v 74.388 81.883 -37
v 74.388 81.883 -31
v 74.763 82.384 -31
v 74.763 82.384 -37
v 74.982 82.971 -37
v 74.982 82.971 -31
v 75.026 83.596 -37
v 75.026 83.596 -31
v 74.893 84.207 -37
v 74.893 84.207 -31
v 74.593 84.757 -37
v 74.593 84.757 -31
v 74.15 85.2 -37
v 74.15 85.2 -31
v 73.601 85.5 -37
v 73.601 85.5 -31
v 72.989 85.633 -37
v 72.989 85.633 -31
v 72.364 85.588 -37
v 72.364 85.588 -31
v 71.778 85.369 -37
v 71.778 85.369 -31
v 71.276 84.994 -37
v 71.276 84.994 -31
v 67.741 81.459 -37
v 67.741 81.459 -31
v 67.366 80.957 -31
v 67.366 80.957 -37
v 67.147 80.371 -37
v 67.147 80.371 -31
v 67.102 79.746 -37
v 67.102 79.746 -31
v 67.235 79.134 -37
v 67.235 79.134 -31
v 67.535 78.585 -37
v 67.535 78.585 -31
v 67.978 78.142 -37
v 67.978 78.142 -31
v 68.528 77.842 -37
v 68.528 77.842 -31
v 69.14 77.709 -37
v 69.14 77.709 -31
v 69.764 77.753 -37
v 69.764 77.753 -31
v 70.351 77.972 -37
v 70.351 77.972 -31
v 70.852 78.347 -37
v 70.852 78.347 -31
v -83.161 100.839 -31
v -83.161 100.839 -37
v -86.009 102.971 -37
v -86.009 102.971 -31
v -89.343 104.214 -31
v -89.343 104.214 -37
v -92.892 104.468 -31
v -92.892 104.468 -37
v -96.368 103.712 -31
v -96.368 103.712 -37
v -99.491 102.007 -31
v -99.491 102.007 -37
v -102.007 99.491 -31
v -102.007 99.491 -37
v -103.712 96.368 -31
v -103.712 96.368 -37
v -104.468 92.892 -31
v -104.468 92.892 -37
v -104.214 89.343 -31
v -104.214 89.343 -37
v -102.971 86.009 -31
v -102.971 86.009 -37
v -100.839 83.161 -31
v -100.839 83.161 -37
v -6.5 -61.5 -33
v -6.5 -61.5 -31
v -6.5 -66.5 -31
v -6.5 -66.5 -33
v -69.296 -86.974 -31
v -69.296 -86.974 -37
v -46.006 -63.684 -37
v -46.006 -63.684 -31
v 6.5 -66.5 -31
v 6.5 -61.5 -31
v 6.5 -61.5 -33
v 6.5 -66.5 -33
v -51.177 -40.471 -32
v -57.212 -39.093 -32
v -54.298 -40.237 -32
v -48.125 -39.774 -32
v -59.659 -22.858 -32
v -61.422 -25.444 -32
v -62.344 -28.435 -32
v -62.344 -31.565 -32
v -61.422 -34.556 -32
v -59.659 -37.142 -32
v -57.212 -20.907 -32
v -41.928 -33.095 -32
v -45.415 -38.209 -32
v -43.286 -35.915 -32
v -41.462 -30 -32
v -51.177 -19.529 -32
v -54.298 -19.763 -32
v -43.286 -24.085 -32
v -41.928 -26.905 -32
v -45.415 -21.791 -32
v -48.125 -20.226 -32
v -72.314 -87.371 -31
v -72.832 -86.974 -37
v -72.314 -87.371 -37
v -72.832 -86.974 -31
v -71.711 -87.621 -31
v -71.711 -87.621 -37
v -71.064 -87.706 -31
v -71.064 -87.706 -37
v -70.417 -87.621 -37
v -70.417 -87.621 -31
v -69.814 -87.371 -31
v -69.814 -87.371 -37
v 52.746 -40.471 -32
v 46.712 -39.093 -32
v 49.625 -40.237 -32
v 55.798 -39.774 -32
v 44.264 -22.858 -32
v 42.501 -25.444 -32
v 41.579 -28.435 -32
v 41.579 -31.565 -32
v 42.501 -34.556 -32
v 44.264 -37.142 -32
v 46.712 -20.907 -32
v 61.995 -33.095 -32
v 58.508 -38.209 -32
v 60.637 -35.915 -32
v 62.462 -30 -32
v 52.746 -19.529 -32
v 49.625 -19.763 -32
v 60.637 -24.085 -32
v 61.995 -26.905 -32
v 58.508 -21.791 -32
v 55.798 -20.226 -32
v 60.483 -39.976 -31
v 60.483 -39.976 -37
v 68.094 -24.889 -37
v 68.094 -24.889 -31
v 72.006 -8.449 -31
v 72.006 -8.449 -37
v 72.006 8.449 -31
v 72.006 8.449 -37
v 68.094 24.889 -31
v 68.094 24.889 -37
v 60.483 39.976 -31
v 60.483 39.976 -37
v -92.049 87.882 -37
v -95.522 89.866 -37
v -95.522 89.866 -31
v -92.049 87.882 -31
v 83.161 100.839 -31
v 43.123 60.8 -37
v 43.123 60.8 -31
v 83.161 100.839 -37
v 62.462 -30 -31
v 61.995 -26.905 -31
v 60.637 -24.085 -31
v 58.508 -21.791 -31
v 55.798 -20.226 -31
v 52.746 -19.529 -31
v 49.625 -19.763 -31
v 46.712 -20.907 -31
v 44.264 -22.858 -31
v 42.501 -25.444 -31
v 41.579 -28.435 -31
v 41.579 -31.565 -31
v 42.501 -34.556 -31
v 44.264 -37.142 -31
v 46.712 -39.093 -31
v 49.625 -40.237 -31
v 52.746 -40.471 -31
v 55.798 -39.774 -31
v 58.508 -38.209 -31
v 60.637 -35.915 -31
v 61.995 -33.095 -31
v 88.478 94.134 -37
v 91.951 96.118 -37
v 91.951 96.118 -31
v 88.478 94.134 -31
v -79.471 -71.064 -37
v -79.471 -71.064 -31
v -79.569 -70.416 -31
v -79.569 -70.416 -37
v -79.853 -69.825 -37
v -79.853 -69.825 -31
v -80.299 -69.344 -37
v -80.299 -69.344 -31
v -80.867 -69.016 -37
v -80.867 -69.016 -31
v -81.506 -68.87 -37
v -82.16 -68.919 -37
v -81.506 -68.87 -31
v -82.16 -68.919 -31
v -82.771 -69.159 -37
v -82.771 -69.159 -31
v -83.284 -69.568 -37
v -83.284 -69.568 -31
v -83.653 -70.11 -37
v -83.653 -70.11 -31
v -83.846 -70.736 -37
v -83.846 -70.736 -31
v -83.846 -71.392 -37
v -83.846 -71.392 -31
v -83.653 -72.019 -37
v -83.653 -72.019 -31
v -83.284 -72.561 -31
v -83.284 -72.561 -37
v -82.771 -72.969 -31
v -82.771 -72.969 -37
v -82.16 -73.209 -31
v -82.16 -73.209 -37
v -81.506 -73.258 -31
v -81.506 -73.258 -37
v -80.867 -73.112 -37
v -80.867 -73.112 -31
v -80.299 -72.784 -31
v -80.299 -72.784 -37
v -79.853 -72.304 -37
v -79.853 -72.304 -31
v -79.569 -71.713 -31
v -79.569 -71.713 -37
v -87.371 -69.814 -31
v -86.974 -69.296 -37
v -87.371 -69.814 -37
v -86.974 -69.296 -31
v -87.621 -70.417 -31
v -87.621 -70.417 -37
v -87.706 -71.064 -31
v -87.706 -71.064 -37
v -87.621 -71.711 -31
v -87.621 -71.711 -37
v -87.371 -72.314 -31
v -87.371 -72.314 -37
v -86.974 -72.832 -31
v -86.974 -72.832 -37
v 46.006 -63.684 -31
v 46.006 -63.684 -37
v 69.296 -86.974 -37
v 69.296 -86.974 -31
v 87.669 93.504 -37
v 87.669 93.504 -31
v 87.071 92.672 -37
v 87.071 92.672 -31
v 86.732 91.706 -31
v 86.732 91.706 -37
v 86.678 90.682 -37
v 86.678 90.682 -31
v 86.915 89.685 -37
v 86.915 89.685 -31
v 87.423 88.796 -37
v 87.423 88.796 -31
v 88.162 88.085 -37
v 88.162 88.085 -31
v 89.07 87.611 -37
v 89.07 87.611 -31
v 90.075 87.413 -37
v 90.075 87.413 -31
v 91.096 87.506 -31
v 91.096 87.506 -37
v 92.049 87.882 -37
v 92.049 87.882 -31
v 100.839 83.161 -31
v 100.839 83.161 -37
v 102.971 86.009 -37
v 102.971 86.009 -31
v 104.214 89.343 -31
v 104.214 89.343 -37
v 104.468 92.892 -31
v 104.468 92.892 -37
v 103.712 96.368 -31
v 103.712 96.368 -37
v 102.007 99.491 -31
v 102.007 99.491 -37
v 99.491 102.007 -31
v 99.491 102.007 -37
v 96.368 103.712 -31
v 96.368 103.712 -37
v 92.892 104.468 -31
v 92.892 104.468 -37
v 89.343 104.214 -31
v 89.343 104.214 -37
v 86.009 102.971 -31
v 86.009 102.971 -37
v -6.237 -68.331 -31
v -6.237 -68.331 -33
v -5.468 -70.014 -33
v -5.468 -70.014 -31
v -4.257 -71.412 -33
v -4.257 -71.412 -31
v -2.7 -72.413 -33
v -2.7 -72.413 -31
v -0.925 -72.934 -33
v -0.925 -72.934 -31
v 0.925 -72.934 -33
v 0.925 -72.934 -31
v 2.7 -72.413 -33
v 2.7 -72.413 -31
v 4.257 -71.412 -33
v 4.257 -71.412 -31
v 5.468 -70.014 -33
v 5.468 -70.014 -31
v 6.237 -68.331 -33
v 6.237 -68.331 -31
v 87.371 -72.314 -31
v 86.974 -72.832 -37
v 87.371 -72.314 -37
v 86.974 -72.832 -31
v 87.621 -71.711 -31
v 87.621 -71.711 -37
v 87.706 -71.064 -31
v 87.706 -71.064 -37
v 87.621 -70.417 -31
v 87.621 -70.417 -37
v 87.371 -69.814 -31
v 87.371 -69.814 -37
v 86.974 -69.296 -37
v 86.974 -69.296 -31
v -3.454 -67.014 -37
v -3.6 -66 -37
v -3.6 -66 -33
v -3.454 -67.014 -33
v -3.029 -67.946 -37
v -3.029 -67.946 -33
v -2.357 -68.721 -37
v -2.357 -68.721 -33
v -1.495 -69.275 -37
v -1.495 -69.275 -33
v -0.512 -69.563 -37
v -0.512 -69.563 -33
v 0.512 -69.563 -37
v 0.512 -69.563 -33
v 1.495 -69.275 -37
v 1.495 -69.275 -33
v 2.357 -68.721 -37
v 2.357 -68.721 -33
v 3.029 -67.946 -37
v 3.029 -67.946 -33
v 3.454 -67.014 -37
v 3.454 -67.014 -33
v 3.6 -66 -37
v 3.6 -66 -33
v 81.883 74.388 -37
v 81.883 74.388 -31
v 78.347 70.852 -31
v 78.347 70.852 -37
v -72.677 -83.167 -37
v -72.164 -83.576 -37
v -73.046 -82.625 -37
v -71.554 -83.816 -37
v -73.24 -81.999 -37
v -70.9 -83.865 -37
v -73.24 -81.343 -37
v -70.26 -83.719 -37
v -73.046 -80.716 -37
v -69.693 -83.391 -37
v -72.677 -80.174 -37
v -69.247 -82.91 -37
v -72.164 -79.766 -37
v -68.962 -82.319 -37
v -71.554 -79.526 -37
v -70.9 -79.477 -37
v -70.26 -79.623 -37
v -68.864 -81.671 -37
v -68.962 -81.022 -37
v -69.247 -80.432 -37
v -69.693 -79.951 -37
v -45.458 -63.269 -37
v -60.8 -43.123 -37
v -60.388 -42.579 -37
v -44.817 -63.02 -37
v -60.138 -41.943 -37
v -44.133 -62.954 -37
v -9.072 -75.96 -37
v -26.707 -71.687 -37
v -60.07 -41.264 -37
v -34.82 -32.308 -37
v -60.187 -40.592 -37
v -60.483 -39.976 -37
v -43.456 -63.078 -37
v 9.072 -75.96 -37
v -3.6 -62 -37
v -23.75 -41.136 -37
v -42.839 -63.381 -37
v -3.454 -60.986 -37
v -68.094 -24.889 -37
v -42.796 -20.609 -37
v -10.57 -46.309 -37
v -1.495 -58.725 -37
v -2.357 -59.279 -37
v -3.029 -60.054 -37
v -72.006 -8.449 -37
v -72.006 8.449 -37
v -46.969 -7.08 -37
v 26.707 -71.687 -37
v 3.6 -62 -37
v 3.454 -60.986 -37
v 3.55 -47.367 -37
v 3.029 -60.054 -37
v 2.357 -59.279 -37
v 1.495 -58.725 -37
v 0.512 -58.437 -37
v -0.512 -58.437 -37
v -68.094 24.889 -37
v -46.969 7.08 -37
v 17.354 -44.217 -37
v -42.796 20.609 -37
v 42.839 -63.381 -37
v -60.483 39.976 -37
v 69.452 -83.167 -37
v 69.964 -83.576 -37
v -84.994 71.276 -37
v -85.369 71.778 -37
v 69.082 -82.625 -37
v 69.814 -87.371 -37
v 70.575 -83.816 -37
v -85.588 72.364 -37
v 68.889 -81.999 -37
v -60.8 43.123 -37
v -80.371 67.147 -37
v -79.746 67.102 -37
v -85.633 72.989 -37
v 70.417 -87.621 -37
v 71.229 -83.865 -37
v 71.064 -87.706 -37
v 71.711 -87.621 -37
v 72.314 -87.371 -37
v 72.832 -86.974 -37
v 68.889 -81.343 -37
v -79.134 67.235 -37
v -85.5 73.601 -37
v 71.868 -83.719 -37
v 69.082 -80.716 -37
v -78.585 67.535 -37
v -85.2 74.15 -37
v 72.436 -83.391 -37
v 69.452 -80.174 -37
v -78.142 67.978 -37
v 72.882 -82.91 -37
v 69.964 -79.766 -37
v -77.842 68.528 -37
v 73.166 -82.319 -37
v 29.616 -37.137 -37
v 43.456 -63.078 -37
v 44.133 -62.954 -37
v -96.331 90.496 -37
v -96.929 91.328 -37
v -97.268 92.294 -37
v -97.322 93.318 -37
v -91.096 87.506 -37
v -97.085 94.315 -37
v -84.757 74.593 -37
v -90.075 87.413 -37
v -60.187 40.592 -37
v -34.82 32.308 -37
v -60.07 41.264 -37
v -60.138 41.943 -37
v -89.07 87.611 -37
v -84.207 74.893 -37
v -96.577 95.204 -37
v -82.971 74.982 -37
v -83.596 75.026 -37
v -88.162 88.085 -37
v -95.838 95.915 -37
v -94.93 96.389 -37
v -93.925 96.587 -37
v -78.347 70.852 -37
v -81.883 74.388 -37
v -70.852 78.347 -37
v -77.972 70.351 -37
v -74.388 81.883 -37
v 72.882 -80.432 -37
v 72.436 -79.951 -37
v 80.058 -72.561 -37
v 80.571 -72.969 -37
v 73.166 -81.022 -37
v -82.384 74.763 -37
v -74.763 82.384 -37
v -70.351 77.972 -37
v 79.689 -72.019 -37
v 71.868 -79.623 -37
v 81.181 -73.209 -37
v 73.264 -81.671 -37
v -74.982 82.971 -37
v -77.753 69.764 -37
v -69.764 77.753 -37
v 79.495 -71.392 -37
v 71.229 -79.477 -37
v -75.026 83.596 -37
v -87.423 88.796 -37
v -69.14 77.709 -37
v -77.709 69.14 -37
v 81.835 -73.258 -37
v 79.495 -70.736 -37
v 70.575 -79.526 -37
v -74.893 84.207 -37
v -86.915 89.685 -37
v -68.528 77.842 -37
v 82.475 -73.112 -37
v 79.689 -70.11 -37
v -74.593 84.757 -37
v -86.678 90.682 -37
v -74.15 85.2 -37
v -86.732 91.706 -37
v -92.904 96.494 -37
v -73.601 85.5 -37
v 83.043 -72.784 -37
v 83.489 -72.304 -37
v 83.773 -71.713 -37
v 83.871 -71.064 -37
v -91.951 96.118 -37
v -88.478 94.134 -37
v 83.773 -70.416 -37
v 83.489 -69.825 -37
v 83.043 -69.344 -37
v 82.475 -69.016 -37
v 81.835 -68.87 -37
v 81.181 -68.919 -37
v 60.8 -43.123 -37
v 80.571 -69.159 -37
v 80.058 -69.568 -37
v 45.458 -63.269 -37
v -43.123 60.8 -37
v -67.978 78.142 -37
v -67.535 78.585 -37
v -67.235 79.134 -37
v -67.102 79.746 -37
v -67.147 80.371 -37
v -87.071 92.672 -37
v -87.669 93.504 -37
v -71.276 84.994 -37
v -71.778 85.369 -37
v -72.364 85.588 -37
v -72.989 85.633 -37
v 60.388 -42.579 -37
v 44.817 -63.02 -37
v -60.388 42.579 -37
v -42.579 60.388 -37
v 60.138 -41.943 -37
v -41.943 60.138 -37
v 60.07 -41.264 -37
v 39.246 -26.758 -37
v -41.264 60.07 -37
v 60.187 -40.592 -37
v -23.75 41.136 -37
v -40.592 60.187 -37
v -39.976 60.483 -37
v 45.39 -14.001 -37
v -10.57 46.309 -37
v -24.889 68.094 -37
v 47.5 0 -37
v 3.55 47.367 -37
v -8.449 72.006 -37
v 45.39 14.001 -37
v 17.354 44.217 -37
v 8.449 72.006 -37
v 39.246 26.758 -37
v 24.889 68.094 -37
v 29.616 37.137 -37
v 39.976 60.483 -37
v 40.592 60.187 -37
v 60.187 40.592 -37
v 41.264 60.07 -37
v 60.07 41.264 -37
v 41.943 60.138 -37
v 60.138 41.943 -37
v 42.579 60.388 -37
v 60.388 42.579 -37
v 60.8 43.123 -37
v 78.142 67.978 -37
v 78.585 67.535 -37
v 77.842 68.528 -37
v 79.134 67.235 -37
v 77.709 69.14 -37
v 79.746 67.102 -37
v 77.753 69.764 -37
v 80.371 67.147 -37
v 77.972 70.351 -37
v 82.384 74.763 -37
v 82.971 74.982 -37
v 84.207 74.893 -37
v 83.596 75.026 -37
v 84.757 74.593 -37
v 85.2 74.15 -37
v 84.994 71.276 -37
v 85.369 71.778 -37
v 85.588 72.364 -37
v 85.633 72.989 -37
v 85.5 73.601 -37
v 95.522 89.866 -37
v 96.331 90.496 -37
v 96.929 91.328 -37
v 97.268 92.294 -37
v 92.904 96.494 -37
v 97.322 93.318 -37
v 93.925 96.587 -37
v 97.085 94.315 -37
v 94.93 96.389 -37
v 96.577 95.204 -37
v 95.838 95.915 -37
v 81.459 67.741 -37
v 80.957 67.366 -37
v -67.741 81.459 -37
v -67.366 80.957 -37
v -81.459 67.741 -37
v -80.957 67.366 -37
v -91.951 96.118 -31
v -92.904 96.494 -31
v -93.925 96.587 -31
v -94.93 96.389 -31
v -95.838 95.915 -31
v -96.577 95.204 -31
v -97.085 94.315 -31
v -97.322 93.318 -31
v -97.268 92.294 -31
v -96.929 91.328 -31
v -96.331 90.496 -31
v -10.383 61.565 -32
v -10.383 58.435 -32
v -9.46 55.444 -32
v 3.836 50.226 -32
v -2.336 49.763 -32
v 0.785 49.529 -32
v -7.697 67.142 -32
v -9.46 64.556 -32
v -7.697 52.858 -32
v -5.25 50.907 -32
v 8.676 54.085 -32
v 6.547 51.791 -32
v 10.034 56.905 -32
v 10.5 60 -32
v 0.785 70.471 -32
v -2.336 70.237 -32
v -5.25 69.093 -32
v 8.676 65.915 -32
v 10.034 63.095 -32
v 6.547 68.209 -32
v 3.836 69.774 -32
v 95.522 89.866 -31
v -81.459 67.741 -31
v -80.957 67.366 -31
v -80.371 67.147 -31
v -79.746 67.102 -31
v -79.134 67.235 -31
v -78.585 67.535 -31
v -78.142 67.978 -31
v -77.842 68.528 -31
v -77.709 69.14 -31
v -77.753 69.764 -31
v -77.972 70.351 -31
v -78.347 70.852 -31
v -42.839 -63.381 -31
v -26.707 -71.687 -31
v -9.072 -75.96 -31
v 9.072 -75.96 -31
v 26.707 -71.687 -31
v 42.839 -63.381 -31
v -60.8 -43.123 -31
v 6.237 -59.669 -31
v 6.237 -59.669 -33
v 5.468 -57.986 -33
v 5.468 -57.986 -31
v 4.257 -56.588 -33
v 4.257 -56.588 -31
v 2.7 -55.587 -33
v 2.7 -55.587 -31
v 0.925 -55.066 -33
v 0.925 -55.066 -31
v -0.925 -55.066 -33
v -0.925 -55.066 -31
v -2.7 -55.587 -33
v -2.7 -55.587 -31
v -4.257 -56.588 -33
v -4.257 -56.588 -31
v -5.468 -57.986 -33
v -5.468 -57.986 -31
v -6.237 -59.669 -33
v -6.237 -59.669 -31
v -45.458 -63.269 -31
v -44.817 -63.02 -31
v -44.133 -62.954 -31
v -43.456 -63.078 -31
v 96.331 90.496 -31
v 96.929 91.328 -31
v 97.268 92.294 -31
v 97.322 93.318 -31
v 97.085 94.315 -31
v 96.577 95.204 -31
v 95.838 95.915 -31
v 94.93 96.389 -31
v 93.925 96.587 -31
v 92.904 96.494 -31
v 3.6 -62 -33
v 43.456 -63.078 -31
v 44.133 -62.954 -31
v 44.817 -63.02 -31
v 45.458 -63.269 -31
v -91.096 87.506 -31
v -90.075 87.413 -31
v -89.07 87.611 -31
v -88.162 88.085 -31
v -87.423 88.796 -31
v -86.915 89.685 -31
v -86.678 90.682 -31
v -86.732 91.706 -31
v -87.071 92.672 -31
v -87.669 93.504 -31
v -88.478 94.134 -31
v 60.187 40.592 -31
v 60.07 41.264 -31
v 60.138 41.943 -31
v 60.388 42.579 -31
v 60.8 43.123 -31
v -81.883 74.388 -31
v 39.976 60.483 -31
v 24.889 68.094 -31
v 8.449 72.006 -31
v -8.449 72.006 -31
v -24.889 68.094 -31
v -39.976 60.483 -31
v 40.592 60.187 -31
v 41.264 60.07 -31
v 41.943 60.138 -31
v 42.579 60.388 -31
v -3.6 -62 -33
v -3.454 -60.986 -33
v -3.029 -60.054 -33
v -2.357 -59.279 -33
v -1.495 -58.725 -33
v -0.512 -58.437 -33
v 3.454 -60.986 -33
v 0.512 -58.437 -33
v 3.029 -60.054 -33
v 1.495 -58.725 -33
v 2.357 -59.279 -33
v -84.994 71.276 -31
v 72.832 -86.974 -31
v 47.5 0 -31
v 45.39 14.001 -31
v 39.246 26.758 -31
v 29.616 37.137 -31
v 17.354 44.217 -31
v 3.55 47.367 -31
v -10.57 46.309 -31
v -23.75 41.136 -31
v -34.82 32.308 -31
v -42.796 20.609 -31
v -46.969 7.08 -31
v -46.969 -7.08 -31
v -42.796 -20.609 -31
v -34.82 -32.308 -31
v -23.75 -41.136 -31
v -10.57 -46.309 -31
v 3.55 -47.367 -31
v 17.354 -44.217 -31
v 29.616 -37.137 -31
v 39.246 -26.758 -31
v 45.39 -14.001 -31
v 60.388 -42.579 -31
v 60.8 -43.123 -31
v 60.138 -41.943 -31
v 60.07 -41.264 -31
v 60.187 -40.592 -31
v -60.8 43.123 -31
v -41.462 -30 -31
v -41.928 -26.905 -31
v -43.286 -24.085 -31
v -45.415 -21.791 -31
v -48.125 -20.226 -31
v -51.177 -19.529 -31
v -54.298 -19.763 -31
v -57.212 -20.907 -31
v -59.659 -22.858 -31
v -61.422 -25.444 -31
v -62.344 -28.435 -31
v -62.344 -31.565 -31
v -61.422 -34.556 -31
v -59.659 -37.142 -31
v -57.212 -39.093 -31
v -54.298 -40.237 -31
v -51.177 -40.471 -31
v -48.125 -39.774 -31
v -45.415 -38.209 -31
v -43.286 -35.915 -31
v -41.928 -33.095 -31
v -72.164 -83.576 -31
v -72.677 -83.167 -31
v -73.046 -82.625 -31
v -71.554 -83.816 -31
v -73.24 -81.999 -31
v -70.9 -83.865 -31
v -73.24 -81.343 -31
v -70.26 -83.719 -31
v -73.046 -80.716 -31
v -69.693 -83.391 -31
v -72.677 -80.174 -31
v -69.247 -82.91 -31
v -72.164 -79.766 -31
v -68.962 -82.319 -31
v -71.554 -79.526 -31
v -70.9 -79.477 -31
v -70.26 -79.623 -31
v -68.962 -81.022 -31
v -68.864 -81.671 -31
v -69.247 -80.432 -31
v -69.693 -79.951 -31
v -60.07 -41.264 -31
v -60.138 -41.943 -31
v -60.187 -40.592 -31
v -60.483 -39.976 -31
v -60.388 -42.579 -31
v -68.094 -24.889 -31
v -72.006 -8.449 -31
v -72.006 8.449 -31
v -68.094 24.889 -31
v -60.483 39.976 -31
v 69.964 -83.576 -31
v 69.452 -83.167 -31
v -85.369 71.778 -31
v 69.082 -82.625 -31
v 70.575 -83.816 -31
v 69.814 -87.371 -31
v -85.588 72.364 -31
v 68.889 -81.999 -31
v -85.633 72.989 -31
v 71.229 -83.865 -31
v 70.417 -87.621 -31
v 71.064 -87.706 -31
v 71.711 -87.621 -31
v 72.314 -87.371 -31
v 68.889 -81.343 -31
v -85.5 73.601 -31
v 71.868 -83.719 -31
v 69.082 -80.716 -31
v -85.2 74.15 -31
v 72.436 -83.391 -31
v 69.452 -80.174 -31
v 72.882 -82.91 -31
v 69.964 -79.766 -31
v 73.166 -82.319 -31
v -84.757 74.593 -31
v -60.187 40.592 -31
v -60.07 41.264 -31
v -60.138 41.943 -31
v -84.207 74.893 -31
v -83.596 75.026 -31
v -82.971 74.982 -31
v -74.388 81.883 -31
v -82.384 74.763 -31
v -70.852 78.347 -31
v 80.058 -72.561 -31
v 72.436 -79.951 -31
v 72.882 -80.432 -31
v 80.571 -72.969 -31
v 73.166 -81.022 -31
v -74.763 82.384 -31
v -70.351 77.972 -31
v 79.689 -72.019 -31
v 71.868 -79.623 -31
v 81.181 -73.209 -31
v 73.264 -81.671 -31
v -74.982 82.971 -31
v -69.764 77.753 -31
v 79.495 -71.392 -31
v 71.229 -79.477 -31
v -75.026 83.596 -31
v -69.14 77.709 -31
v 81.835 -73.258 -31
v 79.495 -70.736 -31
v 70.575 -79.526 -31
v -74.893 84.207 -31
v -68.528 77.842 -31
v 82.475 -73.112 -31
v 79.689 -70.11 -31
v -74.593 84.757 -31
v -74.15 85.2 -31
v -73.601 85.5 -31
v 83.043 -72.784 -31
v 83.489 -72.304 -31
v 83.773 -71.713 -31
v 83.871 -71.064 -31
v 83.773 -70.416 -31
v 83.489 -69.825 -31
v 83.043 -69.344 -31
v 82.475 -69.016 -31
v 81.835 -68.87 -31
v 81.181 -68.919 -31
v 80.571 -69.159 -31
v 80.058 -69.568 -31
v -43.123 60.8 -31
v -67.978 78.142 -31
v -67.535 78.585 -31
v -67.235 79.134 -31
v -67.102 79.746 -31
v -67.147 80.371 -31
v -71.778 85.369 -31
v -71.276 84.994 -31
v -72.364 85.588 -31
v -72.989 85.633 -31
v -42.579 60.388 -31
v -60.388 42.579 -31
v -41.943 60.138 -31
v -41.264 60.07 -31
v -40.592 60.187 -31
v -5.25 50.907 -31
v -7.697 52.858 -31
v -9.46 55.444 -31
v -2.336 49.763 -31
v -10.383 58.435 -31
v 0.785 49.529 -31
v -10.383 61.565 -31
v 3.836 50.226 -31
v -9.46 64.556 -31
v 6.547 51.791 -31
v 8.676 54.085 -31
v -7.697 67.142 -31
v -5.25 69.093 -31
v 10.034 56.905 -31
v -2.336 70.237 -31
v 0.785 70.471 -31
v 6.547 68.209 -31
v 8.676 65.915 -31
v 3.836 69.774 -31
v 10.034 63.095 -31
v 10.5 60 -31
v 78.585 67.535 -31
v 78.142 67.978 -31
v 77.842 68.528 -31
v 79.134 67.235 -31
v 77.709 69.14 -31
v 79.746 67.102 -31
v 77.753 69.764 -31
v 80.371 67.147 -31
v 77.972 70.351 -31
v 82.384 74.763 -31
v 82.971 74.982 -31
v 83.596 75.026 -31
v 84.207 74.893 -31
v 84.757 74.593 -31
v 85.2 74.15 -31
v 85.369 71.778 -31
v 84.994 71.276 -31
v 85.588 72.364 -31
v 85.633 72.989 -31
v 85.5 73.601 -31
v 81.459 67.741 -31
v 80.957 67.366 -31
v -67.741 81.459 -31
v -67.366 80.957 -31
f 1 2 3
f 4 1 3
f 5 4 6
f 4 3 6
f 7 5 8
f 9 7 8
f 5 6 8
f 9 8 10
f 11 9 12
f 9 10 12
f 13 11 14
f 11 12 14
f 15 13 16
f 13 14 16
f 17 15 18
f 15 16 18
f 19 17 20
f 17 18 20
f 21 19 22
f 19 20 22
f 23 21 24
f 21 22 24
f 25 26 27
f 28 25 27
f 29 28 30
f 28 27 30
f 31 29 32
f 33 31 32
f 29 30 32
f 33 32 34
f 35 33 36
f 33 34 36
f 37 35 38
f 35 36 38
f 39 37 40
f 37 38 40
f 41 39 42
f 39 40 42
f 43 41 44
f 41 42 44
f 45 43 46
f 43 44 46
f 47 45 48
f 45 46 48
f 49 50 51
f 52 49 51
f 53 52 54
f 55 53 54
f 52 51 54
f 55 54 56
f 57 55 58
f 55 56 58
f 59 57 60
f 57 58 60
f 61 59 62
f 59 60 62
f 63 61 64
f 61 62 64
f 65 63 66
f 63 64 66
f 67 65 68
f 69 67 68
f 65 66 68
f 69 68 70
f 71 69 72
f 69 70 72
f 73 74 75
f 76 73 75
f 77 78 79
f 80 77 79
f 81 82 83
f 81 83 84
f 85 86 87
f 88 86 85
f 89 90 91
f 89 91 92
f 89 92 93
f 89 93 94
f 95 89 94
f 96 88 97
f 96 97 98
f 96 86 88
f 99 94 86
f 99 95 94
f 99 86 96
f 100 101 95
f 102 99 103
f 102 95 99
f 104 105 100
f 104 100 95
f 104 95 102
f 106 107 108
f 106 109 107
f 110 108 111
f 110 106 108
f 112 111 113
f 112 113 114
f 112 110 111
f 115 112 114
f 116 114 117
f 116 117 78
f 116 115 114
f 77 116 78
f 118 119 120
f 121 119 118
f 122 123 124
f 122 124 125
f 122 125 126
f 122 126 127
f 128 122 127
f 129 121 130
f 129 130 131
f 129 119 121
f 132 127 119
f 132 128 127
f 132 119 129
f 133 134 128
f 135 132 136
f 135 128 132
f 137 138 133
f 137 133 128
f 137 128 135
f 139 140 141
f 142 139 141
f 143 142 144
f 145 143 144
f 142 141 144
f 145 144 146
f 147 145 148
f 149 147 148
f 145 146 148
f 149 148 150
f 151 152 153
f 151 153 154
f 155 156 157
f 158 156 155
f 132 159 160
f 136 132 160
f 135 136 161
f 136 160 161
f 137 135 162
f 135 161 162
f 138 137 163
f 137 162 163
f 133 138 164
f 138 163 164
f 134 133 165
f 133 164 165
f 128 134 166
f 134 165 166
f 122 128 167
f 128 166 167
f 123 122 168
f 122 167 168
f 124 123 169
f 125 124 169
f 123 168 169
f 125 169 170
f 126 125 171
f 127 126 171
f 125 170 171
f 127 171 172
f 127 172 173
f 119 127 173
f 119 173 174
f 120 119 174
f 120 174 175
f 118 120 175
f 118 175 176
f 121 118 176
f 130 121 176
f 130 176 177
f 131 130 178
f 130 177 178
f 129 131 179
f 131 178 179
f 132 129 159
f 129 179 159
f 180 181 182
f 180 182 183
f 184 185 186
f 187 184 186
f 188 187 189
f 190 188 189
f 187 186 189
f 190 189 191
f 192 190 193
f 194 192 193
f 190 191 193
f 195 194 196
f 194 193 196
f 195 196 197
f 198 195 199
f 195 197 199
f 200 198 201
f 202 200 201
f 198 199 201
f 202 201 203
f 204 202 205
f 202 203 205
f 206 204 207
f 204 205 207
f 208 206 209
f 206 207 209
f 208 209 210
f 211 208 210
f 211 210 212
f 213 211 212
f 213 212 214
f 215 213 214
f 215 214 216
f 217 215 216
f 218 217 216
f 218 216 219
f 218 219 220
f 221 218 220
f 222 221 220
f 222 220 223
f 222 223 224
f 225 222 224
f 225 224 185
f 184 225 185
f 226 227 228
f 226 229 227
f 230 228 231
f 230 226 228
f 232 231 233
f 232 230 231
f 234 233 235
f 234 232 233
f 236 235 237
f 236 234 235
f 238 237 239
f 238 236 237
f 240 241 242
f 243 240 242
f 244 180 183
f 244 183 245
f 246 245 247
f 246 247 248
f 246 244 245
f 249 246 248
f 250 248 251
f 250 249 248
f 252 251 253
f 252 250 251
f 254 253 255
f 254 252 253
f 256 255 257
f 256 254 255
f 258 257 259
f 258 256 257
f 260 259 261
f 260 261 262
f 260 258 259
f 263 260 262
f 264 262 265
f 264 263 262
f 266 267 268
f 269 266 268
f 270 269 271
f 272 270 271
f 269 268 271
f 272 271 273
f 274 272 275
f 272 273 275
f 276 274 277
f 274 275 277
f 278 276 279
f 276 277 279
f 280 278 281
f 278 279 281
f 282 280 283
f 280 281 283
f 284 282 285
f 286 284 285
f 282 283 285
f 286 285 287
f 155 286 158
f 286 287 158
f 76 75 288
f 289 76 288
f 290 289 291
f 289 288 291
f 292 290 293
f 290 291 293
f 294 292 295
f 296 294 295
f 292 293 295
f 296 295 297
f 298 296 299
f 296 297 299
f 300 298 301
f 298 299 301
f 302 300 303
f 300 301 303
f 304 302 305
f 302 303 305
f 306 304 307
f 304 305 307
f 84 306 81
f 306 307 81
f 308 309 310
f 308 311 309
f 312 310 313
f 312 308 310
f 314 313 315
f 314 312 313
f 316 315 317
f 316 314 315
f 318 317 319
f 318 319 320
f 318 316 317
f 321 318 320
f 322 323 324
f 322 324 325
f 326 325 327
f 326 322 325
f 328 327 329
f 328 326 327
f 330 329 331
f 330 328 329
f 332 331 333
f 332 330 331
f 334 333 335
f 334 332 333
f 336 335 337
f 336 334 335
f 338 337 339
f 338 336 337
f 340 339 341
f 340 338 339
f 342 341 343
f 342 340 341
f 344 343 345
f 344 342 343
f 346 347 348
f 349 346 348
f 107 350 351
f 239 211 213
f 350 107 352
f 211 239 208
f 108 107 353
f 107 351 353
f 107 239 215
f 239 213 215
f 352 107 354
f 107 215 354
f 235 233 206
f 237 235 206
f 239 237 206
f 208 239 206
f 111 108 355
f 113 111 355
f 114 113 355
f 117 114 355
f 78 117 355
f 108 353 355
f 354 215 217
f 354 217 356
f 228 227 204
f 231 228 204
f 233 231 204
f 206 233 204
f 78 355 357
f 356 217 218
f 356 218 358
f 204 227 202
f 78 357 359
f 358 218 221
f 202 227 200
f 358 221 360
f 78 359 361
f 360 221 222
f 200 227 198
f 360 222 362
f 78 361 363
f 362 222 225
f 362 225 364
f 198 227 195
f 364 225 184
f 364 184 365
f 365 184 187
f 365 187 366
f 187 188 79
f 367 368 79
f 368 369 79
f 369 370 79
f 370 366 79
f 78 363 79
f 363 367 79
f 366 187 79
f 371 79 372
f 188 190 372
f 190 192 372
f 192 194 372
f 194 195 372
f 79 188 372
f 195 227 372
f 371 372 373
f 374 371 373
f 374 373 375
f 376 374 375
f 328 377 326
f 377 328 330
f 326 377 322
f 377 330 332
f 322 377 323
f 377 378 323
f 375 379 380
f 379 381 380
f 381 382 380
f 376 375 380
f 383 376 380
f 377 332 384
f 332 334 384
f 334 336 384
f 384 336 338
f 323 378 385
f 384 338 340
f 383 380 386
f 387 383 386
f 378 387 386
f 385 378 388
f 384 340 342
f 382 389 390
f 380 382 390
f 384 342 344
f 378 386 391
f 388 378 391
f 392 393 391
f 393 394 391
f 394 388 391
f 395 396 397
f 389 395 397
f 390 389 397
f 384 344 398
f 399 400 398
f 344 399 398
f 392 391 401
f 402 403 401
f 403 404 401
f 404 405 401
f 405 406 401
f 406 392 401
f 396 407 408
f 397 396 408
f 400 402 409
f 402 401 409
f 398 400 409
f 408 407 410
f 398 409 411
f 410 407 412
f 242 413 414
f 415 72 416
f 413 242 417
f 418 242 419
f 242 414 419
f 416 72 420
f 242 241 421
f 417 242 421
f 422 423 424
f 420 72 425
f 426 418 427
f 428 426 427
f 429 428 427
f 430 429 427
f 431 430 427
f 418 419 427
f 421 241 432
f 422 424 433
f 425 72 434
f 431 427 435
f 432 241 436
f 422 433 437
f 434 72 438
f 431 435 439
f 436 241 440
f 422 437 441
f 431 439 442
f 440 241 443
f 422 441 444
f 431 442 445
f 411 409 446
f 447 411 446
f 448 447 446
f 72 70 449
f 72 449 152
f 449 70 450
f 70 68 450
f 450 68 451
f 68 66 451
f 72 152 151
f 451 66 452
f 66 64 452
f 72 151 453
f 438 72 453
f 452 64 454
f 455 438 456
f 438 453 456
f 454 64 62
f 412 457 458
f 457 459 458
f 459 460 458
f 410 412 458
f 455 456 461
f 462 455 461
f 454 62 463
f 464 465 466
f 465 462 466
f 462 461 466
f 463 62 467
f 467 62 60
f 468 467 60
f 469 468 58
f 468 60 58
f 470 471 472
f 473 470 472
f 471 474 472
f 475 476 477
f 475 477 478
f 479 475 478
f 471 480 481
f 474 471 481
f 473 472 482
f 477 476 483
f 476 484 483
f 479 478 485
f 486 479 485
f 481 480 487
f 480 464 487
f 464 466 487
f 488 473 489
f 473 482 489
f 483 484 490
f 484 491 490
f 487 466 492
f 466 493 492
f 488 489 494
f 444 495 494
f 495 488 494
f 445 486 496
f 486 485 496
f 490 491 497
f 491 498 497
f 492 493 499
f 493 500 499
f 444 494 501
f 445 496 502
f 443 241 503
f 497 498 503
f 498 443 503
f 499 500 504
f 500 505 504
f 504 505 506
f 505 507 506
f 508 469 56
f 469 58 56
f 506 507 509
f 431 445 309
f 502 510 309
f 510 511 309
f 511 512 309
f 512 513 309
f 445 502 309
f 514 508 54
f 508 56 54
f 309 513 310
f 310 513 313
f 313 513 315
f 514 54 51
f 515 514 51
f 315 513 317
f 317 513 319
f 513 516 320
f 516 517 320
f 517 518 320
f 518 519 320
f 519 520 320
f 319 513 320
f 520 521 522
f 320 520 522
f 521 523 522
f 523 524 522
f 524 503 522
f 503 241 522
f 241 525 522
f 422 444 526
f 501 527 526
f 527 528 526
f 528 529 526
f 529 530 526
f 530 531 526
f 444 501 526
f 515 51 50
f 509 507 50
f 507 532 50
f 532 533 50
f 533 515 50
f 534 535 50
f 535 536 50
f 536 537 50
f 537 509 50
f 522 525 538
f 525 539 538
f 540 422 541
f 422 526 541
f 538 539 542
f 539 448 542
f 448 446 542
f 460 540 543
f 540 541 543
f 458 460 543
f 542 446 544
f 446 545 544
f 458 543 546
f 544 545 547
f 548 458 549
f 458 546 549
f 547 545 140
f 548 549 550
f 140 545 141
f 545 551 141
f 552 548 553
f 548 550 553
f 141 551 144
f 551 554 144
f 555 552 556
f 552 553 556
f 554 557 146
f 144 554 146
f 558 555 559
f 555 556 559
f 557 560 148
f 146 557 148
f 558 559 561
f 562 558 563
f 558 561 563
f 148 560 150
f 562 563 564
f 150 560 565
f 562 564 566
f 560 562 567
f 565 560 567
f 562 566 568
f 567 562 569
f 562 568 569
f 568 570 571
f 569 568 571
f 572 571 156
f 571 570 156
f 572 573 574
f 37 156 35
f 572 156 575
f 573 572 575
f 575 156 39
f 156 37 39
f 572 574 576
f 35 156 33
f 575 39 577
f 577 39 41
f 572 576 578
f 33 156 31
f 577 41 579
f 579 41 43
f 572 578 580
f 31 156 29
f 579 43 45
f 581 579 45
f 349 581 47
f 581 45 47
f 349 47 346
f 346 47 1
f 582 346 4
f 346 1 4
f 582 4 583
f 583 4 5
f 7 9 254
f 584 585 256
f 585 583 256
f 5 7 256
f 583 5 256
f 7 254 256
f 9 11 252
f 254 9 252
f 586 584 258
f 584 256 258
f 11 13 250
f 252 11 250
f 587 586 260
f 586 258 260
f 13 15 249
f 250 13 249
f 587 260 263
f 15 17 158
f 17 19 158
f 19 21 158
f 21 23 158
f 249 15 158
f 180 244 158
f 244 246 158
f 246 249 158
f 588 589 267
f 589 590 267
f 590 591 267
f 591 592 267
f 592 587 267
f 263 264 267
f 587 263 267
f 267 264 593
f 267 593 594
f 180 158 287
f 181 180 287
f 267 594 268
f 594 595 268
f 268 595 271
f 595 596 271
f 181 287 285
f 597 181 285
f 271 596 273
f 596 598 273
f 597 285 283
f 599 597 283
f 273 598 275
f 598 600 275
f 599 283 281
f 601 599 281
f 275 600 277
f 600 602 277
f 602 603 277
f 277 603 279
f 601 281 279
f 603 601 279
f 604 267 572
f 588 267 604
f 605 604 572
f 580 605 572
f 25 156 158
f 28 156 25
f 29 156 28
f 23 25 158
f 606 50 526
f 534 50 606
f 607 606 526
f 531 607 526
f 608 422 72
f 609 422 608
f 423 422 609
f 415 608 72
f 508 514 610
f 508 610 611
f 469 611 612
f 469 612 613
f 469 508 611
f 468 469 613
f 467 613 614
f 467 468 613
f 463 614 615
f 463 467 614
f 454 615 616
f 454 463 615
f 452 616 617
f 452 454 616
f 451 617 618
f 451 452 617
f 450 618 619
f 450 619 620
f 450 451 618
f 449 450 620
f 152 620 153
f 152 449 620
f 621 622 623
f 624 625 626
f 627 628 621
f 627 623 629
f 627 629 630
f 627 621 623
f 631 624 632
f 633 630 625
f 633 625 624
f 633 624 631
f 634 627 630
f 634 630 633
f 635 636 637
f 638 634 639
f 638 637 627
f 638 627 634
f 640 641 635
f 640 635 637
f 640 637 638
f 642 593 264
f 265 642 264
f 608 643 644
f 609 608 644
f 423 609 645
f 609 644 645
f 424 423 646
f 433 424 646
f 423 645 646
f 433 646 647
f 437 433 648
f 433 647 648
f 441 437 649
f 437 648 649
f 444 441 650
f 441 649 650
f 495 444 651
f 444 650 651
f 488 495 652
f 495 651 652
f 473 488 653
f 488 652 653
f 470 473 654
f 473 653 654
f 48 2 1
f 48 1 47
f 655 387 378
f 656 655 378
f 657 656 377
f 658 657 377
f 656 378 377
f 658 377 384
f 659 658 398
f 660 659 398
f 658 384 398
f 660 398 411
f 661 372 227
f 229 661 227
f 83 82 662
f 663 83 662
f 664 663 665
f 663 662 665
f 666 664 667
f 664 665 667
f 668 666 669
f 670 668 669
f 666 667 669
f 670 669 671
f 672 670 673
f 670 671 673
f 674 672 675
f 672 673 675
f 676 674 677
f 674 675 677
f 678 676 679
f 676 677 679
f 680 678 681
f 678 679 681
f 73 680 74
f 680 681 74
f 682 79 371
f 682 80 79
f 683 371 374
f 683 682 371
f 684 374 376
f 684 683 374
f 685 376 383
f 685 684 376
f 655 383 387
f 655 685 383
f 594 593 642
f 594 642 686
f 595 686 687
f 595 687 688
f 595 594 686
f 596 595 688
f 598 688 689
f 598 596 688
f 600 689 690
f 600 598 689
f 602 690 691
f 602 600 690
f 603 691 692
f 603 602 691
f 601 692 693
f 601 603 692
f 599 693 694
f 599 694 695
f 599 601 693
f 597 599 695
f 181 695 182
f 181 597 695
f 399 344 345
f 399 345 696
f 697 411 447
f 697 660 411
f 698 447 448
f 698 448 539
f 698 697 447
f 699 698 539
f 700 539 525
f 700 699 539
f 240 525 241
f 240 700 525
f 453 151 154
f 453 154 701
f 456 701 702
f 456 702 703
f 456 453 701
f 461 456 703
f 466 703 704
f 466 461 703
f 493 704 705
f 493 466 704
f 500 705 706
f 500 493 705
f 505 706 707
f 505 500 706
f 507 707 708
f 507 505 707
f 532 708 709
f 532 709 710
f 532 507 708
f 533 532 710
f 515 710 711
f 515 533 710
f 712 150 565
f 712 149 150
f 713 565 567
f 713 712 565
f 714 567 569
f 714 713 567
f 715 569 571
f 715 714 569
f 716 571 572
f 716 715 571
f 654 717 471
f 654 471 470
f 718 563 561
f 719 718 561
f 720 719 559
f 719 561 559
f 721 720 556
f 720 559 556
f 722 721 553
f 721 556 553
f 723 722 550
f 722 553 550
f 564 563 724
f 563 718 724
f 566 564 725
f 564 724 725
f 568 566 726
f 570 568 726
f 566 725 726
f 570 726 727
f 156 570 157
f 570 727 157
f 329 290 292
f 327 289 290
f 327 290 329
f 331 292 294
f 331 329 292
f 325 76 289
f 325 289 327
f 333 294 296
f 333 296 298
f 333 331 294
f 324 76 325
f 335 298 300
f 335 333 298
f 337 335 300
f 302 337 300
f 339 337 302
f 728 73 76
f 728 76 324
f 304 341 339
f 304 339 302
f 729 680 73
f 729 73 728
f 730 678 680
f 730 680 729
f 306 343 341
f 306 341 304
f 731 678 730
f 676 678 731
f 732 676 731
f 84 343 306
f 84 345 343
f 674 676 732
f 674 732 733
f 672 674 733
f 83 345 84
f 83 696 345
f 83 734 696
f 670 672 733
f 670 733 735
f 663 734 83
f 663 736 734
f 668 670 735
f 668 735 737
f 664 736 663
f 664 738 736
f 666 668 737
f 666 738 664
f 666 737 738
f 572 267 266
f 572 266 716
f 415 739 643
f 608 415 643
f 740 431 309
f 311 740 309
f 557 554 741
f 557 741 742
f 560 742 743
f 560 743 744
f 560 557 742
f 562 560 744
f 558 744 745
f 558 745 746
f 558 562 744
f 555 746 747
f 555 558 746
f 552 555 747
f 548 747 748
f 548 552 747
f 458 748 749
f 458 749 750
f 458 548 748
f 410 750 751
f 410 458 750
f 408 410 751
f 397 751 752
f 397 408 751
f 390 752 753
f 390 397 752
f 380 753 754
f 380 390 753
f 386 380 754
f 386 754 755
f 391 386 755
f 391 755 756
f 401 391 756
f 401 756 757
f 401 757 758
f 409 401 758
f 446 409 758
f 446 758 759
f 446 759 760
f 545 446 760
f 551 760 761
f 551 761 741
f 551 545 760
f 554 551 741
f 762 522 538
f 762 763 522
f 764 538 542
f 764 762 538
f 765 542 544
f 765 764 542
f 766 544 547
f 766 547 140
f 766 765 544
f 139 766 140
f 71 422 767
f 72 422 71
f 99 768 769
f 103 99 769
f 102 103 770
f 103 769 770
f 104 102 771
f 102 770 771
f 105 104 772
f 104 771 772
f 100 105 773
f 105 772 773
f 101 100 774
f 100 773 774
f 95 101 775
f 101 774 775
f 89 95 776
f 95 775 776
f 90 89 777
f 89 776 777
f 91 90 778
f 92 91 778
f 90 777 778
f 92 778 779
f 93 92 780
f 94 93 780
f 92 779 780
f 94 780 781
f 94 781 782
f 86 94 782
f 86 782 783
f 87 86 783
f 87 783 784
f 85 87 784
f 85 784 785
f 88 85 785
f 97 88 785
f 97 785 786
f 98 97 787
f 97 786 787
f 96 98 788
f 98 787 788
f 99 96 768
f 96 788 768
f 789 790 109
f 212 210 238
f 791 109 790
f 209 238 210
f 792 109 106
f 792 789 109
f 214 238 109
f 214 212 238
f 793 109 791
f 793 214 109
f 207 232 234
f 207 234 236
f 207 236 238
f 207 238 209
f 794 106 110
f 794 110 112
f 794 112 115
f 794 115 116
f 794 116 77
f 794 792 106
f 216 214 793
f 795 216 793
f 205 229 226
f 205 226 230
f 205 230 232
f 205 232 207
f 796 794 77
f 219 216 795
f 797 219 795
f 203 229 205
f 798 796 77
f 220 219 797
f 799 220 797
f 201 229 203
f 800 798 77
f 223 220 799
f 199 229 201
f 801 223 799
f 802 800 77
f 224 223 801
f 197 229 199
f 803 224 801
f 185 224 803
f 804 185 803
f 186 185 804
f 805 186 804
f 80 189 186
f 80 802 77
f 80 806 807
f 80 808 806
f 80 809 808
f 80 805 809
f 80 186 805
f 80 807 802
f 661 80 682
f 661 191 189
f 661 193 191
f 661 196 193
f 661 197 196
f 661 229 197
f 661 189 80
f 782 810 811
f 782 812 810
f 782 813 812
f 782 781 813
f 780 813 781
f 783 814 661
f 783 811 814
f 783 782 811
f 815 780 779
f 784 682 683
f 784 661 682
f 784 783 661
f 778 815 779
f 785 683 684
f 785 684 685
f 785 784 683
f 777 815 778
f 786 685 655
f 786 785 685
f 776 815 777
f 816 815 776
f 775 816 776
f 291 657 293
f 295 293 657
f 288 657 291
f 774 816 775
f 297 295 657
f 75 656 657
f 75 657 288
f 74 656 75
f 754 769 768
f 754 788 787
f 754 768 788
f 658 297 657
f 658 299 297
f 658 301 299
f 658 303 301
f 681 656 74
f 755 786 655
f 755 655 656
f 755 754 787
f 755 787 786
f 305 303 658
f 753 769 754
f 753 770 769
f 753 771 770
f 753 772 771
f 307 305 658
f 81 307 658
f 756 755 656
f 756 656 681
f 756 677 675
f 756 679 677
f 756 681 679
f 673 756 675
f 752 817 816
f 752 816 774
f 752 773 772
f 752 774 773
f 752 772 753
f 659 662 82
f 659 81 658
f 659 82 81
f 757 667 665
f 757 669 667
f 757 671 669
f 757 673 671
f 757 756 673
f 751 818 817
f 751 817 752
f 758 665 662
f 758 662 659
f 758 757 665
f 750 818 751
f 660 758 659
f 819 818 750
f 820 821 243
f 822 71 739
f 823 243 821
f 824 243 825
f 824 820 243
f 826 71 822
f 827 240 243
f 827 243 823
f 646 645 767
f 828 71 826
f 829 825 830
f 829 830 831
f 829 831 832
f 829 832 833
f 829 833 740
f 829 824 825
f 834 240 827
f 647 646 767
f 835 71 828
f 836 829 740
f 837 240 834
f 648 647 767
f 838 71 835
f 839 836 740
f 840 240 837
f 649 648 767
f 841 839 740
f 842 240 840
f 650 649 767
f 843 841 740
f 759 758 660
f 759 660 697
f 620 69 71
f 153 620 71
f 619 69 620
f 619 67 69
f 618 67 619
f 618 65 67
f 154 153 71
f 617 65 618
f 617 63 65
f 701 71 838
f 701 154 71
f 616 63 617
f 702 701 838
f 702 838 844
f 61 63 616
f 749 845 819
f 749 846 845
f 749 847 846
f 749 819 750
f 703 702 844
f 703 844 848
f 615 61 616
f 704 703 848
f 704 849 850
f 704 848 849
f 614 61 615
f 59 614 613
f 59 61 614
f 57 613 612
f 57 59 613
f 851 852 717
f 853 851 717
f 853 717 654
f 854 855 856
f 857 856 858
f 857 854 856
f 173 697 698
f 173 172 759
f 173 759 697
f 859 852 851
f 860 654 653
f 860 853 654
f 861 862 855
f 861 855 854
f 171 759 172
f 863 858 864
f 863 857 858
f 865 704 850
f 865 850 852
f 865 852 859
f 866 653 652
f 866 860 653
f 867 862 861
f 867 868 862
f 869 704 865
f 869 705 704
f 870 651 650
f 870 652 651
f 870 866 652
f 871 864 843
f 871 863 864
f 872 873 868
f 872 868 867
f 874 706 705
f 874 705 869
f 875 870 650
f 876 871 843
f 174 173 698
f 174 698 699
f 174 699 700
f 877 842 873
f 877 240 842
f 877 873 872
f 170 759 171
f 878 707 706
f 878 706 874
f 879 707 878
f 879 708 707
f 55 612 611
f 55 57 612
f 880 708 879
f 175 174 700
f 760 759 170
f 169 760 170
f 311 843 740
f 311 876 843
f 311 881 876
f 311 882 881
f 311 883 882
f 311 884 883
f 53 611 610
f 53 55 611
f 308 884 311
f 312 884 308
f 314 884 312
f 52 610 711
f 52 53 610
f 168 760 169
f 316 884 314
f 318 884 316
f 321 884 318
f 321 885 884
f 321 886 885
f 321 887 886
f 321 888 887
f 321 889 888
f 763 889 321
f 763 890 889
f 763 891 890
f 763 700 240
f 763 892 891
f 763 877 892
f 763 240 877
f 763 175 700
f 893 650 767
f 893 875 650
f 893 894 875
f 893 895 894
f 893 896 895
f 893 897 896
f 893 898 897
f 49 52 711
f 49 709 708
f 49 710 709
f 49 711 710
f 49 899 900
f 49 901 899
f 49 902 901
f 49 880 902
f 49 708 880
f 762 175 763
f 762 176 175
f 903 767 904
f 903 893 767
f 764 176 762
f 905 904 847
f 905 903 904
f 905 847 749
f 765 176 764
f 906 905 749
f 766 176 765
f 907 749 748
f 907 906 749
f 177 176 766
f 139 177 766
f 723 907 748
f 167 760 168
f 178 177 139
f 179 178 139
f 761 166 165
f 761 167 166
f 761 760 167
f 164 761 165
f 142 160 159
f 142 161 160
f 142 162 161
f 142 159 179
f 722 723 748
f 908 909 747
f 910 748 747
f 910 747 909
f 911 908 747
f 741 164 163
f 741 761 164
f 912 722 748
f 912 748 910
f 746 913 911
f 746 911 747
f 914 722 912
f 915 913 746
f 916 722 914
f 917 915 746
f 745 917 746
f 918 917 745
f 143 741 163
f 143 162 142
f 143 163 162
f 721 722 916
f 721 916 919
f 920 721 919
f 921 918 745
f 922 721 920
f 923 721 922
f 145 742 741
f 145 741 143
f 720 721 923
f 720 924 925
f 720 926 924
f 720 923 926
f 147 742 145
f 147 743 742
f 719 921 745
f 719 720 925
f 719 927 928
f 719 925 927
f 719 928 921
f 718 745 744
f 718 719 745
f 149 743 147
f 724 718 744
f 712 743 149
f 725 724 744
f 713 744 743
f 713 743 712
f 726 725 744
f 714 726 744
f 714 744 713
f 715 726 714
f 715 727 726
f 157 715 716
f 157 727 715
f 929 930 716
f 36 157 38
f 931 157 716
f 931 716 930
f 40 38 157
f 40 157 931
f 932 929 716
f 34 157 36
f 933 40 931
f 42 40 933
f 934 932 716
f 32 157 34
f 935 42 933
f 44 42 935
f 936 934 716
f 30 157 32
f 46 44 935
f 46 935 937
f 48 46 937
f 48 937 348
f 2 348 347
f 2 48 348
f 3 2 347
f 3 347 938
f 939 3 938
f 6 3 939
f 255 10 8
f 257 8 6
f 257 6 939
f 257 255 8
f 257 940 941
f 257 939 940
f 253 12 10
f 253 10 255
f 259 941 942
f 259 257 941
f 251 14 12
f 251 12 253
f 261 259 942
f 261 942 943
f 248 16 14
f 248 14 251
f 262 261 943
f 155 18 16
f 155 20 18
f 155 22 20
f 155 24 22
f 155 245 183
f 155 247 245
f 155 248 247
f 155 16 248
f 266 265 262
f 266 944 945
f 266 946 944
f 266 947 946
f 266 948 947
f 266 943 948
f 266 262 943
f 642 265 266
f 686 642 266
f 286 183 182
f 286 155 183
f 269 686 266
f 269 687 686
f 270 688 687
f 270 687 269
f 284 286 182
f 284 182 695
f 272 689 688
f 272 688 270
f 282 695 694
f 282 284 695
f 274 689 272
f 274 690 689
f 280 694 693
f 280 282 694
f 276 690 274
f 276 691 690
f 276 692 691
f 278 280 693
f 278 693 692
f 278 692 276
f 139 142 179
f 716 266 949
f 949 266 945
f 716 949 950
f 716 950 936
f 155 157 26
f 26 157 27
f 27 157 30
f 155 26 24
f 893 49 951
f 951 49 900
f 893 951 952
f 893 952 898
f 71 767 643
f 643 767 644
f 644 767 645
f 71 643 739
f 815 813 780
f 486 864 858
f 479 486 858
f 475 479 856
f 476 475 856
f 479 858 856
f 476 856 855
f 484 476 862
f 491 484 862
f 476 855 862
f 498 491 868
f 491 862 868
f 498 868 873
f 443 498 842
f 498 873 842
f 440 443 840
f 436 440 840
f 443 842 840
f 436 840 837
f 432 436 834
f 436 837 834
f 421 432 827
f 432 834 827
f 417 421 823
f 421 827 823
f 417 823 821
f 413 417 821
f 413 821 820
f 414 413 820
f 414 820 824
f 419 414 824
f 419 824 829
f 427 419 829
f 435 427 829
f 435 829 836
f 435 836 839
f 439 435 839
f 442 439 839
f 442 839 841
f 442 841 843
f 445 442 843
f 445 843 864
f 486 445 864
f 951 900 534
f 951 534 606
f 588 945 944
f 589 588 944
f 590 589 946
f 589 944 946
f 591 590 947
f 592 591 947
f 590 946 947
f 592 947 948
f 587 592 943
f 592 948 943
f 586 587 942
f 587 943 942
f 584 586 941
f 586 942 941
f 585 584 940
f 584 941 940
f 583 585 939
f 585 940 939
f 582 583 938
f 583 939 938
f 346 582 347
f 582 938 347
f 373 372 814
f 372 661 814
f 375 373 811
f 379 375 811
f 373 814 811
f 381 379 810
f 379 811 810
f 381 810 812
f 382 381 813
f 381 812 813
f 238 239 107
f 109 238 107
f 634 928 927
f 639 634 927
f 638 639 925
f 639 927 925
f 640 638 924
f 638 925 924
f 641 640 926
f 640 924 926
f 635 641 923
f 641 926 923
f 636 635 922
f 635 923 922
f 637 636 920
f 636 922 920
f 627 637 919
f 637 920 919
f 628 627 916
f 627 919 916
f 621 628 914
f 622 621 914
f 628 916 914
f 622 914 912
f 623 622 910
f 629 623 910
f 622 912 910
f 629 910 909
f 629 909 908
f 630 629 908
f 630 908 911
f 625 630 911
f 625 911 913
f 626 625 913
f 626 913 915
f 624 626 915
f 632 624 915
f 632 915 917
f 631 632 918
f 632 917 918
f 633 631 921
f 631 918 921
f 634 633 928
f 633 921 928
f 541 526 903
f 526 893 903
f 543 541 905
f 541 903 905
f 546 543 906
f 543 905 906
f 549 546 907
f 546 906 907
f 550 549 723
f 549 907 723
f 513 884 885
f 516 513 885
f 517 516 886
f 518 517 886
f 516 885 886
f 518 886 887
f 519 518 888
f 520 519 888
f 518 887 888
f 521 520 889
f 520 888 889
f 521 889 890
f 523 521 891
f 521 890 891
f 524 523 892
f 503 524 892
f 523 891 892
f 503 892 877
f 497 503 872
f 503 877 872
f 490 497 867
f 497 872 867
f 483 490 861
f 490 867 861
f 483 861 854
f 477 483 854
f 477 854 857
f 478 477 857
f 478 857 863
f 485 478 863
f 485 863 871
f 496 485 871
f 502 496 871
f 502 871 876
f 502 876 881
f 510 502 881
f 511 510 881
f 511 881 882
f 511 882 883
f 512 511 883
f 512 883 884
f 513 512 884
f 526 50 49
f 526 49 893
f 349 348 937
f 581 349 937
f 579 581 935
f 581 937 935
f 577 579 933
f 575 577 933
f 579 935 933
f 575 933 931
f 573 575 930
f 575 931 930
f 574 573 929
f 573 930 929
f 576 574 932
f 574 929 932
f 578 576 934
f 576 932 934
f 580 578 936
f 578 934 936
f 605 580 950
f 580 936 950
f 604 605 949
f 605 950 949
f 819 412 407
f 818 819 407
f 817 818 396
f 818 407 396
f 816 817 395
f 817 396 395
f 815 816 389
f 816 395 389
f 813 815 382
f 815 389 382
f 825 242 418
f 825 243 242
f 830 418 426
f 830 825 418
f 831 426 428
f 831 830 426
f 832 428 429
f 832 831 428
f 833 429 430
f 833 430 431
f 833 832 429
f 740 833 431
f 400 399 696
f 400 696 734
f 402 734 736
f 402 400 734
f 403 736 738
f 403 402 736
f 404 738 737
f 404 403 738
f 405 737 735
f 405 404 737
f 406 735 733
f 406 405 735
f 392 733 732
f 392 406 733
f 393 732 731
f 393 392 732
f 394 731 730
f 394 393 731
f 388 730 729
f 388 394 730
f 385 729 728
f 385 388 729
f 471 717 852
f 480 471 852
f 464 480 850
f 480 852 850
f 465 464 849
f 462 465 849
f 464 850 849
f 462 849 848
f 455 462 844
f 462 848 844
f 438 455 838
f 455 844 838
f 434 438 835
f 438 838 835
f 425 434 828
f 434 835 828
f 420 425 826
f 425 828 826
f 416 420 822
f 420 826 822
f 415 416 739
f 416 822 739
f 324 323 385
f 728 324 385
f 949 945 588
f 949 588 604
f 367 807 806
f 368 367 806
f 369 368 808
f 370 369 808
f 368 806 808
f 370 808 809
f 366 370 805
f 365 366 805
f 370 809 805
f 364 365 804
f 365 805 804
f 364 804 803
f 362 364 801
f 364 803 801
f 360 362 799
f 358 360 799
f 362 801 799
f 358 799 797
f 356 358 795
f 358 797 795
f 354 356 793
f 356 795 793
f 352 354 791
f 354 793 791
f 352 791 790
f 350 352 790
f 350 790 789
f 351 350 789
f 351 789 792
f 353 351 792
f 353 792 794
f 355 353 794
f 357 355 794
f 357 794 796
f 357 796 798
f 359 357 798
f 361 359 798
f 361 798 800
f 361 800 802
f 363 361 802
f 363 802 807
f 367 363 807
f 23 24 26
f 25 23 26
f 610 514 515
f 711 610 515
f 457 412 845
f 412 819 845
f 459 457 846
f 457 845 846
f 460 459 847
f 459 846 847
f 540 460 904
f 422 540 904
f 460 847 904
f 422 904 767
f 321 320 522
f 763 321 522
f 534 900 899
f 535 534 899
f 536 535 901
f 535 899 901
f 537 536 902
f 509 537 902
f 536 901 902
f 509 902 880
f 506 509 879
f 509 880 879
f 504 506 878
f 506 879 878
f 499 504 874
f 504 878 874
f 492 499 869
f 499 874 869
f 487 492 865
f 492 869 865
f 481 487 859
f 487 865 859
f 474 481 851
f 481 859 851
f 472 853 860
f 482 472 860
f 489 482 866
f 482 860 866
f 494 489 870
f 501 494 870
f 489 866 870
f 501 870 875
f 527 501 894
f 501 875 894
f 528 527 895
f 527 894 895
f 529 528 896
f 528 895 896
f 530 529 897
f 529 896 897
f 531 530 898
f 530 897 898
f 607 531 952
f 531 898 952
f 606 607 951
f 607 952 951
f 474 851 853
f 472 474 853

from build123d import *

# Parameters (mm, degrees)
SKETCH_R        = 47.5
PAD021_DEPTH    = 6
SKETCH017_R     = 2.2
POCKET013_DEPTH = 6.001
POCKET014_DEPTH = 2
FILLET_R        = 2.5
SKETCH024_R     = 10.5
POCKET036_DEPTH = 1


with BuildPart() as part:
    # Sketch → Pad021 (new body)
    with BuildSketch(Plane.XY):
        with BuildLine():
            Line((-59.336359, -41.65869), (-88.741901, -71.064232))
            Line((-88.741901, -71.064232), (-71.064232, -88.741901))
            Line((-71.064232, -88.741901), (-44.527821, -62.205491))
            ThreePointArc((-44.527821, -62.205491), (0, -76.5), (44.527821, -62.205491))
            Line((44.527821, -62.205491), (71.064232, -88.741901))
            Line((71.064232, -88.741901), (88.741901, -71.064232))
            Line((88.741901, -71.064232), (59.336359, -41.65869))
            ThreePointArc((59.336359, -41.65869), (72.5, 0), (59.336359, 41.65869))
            Line((100.838835, 83.161165), (59.336359, 41.65869))
            ThreePointArc((100.838835, 83.161165), (100.838835, 100.838835), (83.161165, 100.838835))
            Line((41.65869, 59.336359), (83.161165, 100.838835))
            ThreePointArc((41.65869, 59.336359), (0, 72.5), (-41.65869, 59.336359))
            Line((-83.161165, 100.838835), (-41.65869, 59.336359))
            ThreePointArc((-83.161165, 100.838835), (-100.838835, 100.838835), (-100.838835, 83.161165))
            Line((-59.336359, 41.65869), (-100.838835, 83.161165))
            ThreePointArc((-59.336359, 41.65869), (-72.5, 0), (-59.336359, -41.65869))
        make_face()
        Circle(SKETCH_R, mode=Mode.SUBTRACT)
        with BuildLine():
            ThreePointArc((-91.951086, 96.117962), (-96.862634, 94.777552), (-95.522224, 89.866004))
            Line((-95.522224, 89.866004), (-92.048914, 87.882038))
            ThreePointArc((-92.048914, 87.882038), (-87.137366, 89.222448), (-88.477776, 94.133996))
            Line((-91.951086, 96.117962), (-88.477776, 94.133996))
        make_face(mode=Mode.SUBTRACT)
        with BuildLine():
            ThreePointArc((95.522224, 89.866004), (96.862634, 94.777552), (91.951086, 96.117962))
            Line((91.951086, 96.117962), (88.477776, 94.133996))
            ThreePointArc((88.477776, 94.133996), (87.137366, 89.222448), (92.048914, 87.882038))
            Line((95.522224, 89.866004), (92.048914, 87.882038))
        make_face(mode=Mode.SUBTRACT)
        with BuildLine():
            ThreePointArc((-3.6, -66), (0, -69.6), (3.6, -66))
            Line((3.6, -66), (3.6, -62))
            ThreePointArc((3.6, -62), (0, -58.4), (-3.6, -62))
            Line((-3.6, -66), (-3.6, -62))
        make_face(mode=Mode.SUBTRACT)
    extrude(amount=PAD021_DEPTH)

    # Sketch017 (on DatumPlane) → Pocket013 (cut, through all)
    with BuildSketch(Plane.XY.offset(6)):
        with Locations((81.670833, -71.064232)):
            Circle(SKETCH017_R)
        with Locations((71.064232, -81.670833)):
            Circle(SKETCH017_R)
        with Locations((-71.064232, -81.670833)):
            Circle(SKETCH017_R)
        with Locations((-81.670833, -71.064232)):
            Circle(SKETCH017_R)
        with BuildLine():
            ThreePointArc((74.387633, 81.882965), (74.387633, 84.994235), (71.276364, 84.994235))
            Line((71.276364, 84.994235), (67.74083, 81.458701))
            ThreePointArc((67.74083, 81.458701), (67.74083, 78.347431), (70.852099, 78.347431))
            Line((74.387633, 81.882965), (70.852099, 78.347431))
        make_face()
        with BuildLine():
            ThreePointArc((84.994235, 71.276364), (84.994235, 74.387633), (81.882965, 74.387633))
            Line((81.882965, 74.387633), (78.347431, 70.852099))
            ThreePointArc((78.347431, 70.852099), (78.347431, 67.74083), (81.458701, 67.74083))
            Line((84.994235, 71.276364), (81.458701, 67.74083))
        make_face()
        with BuildLine():
            ThreePointArc((-71.276364, 84.994235), (-74.387633, 84.994235), (-74.387633, 81.882965))
            Line((-74.387633, 81.882965), (-70.852099, 78.347431))
            ThreePointArc((-70.852099, 78.347431), (-67.74083, 78.347431), (-67.74083, 81.458701))
            Line((-71.276364, 84.994235), (-67.74083, 81.458701))
        make_face()
        with BuildLine():
            ThreePointArc((-81.882965, 74.387633), (-84.994235, 74.387633), (-84.994235, 71.276364))
            Line((-84.994235, 71.276364), (-81.458701, 67.74083))
            ThreePointArc((-81.458701, 67.74083), (-78.347431, 67.74083), (-78.347431, 70.852099))
            Line((-81.882965, 74.387633), (-78.347431, 70.852099))
        make_face()
    extrude(amount=-POCKET013_DEPTH, mode=Mode.SUBTRACT)

    # Sketch012 (on DatumPlane) → Pocket014 (cut)
    with BuildSketch(Plane.XY.offset(6)):
        with BuildLine():
            ThreePointArc((6.5, -61.5), (0, -55), (-6.5, -61.5))
            Line((-6.5, -61.5), (-6.5, -66.5))
            ThreePointArc((-6.5, -66.5), (0, -73), (6.5, -66.5))
            Line((6.5, -61.5), (6.5, -66.5))
        make_face()
    extrude(amount=-POCKET014_DEPTH, mode=Mode.SUBTRACT)

    # Fillet
    fillet_edges = [part.edges().sort_by_distance(p)[0] for p in [
        (-59.336359, 41.65869, 3),
        (-59.336359, -41.65869, 3),
        (-88.741901, -71.064232, 3),
        (-84.994235, 71.276364, 3),
        (-74.387633, 81.882965, 3),
        (-71.276364, 84.994235, 3),
        (-81.882965, 74.387633, 3),
        (-44.527821, -62.205491, 3),
        (44.527821, -62.205491, 3),
        (59.336359, -41.65869, 3),
        (59.336359, 41.65869, 3),
        (41.65869, 59.336359, 3),
        (-41.65869, 59.336359, 3),
        (-71.064232, -88.741901, 3),
        (71.064232, -88.741901, 3),
        (88.741901, -71.064232, 3),
    ]]
    fillet(fillet_edges, radius=FILLET_R)

    # Sketch024 (on DatumPlane) → Pocket036 (cut)
    with BuildSketch(Plane.XY.offset(6)):
        with Locations((0, 60)):
            Circle(SKETCH024_R)
        with Locations((-51.961524, -30)):
            Circle(SKETCH024_R)
        with Locations((51.961524, -30)):
            Circle(SKETCH024_R)
    extrude(amount=-POCKET036_DEPTH, mode=Mode.SUBTRACT)


with BuildPart() as part_1:
    # Body placement: moved
    add(part.part.moved(Location((0, 0, -37))))


solid = part_1.part
